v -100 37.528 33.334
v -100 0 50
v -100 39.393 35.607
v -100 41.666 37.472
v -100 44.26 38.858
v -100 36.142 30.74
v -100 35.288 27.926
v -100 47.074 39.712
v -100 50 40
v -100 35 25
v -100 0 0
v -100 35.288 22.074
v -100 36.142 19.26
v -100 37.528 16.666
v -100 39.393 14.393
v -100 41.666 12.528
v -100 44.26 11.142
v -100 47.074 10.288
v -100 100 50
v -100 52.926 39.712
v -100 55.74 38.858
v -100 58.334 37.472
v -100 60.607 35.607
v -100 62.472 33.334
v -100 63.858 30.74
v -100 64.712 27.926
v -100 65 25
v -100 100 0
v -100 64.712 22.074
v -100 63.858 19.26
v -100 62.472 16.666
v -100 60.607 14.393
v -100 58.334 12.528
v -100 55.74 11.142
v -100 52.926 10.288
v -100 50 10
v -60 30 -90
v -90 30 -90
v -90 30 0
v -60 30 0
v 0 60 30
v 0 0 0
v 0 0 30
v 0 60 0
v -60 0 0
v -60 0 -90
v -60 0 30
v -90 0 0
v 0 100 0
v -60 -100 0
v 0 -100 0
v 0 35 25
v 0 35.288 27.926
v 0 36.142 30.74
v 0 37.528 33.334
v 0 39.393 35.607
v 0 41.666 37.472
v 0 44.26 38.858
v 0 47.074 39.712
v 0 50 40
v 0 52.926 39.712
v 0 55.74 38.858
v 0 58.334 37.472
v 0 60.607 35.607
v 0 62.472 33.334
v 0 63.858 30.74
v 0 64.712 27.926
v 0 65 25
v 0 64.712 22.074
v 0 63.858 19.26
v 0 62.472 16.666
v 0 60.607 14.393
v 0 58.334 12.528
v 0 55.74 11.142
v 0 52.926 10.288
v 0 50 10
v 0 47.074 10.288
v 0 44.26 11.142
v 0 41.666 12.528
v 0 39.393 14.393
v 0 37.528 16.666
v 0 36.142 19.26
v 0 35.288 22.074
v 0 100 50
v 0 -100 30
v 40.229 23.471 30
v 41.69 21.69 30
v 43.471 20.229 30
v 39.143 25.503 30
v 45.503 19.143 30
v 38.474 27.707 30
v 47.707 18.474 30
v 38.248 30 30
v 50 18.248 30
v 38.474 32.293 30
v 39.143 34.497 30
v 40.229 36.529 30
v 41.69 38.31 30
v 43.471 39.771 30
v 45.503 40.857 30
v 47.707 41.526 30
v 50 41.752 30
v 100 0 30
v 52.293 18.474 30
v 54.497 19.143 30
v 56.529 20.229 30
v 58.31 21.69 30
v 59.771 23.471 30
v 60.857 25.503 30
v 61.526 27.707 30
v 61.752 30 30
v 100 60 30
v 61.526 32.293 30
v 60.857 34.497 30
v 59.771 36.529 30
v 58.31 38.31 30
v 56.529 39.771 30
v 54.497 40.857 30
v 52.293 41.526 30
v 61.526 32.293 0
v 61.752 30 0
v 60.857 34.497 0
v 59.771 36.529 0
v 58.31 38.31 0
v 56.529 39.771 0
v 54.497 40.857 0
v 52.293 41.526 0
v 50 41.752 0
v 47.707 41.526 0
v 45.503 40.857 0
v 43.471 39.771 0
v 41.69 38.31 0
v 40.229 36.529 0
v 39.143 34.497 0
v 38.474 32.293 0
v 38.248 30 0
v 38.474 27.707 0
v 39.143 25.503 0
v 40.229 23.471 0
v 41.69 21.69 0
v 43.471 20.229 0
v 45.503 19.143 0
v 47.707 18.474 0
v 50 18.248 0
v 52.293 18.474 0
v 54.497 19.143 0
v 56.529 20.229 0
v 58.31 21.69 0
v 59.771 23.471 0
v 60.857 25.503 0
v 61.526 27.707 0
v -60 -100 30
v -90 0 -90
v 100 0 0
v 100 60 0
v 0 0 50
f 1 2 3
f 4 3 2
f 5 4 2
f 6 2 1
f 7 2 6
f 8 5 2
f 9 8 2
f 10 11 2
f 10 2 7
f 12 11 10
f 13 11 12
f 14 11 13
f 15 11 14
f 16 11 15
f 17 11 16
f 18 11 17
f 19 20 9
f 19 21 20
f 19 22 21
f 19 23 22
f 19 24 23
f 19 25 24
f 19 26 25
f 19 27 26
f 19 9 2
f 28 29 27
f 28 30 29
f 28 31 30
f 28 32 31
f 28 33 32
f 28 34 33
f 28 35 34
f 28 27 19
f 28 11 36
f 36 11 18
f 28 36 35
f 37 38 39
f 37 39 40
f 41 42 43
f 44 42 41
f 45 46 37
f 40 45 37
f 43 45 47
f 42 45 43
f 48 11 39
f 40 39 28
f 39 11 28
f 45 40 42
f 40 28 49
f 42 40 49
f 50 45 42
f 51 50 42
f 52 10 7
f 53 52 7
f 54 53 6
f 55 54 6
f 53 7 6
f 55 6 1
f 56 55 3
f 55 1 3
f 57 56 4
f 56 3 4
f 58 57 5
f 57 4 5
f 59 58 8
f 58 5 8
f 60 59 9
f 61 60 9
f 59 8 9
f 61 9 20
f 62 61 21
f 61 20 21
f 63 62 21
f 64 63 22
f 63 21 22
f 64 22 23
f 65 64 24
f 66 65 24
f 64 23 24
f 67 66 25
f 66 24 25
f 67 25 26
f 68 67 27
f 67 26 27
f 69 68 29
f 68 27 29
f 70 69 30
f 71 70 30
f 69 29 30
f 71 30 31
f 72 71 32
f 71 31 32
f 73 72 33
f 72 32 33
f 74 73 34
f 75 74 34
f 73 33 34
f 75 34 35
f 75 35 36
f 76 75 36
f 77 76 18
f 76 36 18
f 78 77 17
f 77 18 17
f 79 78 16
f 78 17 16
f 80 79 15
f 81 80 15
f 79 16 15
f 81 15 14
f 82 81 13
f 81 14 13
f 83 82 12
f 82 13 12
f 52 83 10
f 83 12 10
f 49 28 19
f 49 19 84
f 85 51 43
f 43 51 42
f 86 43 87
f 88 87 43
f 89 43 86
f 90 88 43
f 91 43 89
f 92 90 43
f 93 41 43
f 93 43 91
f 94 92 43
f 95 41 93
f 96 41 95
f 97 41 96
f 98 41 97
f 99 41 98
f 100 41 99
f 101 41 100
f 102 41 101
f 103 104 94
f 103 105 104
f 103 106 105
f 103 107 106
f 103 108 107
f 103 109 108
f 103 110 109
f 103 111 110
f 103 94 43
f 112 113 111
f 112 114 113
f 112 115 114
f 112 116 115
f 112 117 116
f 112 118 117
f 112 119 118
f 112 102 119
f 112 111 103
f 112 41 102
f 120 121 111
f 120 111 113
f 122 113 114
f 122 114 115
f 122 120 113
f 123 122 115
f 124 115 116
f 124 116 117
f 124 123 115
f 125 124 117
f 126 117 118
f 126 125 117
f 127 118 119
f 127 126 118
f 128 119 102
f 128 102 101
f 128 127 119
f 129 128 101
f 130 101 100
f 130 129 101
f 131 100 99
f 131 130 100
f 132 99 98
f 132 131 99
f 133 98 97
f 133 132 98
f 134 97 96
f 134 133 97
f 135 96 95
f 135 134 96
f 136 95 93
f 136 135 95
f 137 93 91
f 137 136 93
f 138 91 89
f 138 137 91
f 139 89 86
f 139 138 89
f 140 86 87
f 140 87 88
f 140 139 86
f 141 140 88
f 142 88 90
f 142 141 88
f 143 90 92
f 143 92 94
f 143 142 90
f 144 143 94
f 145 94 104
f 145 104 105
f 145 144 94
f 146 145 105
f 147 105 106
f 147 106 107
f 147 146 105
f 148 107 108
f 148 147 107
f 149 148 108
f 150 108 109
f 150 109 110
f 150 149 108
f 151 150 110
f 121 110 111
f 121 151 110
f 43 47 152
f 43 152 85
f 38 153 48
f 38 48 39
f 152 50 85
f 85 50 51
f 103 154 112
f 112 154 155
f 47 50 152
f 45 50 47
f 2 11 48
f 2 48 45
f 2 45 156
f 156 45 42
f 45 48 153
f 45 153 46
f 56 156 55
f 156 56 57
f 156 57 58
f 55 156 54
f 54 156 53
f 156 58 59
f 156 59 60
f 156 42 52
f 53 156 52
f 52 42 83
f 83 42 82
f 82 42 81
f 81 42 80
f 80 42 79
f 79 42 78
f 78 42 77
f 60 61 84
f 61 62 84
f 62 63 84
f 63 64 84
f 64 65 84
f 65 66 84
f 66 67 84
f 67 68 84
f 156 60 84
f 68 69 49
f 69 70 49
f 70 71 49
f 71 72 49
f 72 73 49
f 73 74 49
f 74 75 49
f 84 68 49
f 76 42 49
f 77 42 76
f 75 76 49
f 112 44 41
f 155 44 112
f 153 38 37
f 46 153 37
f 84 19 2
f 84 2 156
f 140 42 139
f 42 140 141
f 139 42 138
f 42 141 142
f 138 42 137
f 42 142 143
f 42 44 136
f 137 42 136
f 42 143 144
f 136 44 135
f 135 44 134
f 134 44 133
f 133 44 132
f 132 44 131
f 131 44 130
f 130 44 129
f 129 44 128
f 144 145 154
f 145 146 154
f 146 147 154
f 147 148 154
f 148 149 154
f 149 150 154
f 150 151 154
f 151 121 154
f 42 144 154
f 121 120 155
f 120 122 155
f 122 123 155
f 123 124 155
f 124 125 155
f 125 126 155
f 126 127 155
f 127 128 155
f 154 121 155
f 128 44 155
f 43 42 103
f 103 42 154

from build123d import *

# Parameters (mm, degrees)
F0_W     = 100
F0_H     = 60
F0_R     = 11.7517787986
F1_DEPTH = 30
F2_W     = 60
F2_H     = 100
F3_DEPTH = 30
F4_W     = 100
F4_H     = 100
F5_DEPTH = 50
F6_R     = 15
F7_DEPTH = 100
F2_W_2   = 30
F2_H_2   = 30
F8_DEPTH = 90


with BuildPart() as f1:
    # F0 (on Top) → F1 (new body)
    with BuildSketch(Plane.XY):
        with Locations((50, 30)):
            Rectangle(F0_W, F0_H)
        with Locations((50, 30)):
            Circle(F0_R, mode=Mode.SUBTRACT)
    extrude(amount=F1_DEPTH)


with BuildPart() as f3:
    # F2 (on Top) → F3 (new body)
    with BuildSketch(Plane.XY):
        with Locations((-30, -50)):
            Rectangle(F2_W, F2_H)
    extrude(amount=F3_DEPTH)


with BuildPart() as f5:
    # F4 (on Top) → F5 (new body)
    with BuildSketch(Plane.XY):
        with Locations((-50, 50)):
            Rectangle(F4_W, F4_H)
    extrude(amount=F5_DEPTH)

    # F6 (on face) → F7 (cut, through all)
    with BuildSketch(Plane(origin=(-100, 0, 0), x_dir=(0, -1, 0), z_dir=(-1, 0, 0))):
        with Locations((-50, 25)):
            Circle(F6_R)
    extrude(amount=-F7_DEPTH, mode=Mode.SUBTRACT)

    # F2 (on Top) → F8 (join)
    with BuildSketch(Plane.XY):
        with Locations((-75, 15)):
            Rectangle(F2_W_2, F2_H_2)
    extrude(amount=-F8_DEPTH)


solid = Compound([f1.part, f3.part, f5.part])
